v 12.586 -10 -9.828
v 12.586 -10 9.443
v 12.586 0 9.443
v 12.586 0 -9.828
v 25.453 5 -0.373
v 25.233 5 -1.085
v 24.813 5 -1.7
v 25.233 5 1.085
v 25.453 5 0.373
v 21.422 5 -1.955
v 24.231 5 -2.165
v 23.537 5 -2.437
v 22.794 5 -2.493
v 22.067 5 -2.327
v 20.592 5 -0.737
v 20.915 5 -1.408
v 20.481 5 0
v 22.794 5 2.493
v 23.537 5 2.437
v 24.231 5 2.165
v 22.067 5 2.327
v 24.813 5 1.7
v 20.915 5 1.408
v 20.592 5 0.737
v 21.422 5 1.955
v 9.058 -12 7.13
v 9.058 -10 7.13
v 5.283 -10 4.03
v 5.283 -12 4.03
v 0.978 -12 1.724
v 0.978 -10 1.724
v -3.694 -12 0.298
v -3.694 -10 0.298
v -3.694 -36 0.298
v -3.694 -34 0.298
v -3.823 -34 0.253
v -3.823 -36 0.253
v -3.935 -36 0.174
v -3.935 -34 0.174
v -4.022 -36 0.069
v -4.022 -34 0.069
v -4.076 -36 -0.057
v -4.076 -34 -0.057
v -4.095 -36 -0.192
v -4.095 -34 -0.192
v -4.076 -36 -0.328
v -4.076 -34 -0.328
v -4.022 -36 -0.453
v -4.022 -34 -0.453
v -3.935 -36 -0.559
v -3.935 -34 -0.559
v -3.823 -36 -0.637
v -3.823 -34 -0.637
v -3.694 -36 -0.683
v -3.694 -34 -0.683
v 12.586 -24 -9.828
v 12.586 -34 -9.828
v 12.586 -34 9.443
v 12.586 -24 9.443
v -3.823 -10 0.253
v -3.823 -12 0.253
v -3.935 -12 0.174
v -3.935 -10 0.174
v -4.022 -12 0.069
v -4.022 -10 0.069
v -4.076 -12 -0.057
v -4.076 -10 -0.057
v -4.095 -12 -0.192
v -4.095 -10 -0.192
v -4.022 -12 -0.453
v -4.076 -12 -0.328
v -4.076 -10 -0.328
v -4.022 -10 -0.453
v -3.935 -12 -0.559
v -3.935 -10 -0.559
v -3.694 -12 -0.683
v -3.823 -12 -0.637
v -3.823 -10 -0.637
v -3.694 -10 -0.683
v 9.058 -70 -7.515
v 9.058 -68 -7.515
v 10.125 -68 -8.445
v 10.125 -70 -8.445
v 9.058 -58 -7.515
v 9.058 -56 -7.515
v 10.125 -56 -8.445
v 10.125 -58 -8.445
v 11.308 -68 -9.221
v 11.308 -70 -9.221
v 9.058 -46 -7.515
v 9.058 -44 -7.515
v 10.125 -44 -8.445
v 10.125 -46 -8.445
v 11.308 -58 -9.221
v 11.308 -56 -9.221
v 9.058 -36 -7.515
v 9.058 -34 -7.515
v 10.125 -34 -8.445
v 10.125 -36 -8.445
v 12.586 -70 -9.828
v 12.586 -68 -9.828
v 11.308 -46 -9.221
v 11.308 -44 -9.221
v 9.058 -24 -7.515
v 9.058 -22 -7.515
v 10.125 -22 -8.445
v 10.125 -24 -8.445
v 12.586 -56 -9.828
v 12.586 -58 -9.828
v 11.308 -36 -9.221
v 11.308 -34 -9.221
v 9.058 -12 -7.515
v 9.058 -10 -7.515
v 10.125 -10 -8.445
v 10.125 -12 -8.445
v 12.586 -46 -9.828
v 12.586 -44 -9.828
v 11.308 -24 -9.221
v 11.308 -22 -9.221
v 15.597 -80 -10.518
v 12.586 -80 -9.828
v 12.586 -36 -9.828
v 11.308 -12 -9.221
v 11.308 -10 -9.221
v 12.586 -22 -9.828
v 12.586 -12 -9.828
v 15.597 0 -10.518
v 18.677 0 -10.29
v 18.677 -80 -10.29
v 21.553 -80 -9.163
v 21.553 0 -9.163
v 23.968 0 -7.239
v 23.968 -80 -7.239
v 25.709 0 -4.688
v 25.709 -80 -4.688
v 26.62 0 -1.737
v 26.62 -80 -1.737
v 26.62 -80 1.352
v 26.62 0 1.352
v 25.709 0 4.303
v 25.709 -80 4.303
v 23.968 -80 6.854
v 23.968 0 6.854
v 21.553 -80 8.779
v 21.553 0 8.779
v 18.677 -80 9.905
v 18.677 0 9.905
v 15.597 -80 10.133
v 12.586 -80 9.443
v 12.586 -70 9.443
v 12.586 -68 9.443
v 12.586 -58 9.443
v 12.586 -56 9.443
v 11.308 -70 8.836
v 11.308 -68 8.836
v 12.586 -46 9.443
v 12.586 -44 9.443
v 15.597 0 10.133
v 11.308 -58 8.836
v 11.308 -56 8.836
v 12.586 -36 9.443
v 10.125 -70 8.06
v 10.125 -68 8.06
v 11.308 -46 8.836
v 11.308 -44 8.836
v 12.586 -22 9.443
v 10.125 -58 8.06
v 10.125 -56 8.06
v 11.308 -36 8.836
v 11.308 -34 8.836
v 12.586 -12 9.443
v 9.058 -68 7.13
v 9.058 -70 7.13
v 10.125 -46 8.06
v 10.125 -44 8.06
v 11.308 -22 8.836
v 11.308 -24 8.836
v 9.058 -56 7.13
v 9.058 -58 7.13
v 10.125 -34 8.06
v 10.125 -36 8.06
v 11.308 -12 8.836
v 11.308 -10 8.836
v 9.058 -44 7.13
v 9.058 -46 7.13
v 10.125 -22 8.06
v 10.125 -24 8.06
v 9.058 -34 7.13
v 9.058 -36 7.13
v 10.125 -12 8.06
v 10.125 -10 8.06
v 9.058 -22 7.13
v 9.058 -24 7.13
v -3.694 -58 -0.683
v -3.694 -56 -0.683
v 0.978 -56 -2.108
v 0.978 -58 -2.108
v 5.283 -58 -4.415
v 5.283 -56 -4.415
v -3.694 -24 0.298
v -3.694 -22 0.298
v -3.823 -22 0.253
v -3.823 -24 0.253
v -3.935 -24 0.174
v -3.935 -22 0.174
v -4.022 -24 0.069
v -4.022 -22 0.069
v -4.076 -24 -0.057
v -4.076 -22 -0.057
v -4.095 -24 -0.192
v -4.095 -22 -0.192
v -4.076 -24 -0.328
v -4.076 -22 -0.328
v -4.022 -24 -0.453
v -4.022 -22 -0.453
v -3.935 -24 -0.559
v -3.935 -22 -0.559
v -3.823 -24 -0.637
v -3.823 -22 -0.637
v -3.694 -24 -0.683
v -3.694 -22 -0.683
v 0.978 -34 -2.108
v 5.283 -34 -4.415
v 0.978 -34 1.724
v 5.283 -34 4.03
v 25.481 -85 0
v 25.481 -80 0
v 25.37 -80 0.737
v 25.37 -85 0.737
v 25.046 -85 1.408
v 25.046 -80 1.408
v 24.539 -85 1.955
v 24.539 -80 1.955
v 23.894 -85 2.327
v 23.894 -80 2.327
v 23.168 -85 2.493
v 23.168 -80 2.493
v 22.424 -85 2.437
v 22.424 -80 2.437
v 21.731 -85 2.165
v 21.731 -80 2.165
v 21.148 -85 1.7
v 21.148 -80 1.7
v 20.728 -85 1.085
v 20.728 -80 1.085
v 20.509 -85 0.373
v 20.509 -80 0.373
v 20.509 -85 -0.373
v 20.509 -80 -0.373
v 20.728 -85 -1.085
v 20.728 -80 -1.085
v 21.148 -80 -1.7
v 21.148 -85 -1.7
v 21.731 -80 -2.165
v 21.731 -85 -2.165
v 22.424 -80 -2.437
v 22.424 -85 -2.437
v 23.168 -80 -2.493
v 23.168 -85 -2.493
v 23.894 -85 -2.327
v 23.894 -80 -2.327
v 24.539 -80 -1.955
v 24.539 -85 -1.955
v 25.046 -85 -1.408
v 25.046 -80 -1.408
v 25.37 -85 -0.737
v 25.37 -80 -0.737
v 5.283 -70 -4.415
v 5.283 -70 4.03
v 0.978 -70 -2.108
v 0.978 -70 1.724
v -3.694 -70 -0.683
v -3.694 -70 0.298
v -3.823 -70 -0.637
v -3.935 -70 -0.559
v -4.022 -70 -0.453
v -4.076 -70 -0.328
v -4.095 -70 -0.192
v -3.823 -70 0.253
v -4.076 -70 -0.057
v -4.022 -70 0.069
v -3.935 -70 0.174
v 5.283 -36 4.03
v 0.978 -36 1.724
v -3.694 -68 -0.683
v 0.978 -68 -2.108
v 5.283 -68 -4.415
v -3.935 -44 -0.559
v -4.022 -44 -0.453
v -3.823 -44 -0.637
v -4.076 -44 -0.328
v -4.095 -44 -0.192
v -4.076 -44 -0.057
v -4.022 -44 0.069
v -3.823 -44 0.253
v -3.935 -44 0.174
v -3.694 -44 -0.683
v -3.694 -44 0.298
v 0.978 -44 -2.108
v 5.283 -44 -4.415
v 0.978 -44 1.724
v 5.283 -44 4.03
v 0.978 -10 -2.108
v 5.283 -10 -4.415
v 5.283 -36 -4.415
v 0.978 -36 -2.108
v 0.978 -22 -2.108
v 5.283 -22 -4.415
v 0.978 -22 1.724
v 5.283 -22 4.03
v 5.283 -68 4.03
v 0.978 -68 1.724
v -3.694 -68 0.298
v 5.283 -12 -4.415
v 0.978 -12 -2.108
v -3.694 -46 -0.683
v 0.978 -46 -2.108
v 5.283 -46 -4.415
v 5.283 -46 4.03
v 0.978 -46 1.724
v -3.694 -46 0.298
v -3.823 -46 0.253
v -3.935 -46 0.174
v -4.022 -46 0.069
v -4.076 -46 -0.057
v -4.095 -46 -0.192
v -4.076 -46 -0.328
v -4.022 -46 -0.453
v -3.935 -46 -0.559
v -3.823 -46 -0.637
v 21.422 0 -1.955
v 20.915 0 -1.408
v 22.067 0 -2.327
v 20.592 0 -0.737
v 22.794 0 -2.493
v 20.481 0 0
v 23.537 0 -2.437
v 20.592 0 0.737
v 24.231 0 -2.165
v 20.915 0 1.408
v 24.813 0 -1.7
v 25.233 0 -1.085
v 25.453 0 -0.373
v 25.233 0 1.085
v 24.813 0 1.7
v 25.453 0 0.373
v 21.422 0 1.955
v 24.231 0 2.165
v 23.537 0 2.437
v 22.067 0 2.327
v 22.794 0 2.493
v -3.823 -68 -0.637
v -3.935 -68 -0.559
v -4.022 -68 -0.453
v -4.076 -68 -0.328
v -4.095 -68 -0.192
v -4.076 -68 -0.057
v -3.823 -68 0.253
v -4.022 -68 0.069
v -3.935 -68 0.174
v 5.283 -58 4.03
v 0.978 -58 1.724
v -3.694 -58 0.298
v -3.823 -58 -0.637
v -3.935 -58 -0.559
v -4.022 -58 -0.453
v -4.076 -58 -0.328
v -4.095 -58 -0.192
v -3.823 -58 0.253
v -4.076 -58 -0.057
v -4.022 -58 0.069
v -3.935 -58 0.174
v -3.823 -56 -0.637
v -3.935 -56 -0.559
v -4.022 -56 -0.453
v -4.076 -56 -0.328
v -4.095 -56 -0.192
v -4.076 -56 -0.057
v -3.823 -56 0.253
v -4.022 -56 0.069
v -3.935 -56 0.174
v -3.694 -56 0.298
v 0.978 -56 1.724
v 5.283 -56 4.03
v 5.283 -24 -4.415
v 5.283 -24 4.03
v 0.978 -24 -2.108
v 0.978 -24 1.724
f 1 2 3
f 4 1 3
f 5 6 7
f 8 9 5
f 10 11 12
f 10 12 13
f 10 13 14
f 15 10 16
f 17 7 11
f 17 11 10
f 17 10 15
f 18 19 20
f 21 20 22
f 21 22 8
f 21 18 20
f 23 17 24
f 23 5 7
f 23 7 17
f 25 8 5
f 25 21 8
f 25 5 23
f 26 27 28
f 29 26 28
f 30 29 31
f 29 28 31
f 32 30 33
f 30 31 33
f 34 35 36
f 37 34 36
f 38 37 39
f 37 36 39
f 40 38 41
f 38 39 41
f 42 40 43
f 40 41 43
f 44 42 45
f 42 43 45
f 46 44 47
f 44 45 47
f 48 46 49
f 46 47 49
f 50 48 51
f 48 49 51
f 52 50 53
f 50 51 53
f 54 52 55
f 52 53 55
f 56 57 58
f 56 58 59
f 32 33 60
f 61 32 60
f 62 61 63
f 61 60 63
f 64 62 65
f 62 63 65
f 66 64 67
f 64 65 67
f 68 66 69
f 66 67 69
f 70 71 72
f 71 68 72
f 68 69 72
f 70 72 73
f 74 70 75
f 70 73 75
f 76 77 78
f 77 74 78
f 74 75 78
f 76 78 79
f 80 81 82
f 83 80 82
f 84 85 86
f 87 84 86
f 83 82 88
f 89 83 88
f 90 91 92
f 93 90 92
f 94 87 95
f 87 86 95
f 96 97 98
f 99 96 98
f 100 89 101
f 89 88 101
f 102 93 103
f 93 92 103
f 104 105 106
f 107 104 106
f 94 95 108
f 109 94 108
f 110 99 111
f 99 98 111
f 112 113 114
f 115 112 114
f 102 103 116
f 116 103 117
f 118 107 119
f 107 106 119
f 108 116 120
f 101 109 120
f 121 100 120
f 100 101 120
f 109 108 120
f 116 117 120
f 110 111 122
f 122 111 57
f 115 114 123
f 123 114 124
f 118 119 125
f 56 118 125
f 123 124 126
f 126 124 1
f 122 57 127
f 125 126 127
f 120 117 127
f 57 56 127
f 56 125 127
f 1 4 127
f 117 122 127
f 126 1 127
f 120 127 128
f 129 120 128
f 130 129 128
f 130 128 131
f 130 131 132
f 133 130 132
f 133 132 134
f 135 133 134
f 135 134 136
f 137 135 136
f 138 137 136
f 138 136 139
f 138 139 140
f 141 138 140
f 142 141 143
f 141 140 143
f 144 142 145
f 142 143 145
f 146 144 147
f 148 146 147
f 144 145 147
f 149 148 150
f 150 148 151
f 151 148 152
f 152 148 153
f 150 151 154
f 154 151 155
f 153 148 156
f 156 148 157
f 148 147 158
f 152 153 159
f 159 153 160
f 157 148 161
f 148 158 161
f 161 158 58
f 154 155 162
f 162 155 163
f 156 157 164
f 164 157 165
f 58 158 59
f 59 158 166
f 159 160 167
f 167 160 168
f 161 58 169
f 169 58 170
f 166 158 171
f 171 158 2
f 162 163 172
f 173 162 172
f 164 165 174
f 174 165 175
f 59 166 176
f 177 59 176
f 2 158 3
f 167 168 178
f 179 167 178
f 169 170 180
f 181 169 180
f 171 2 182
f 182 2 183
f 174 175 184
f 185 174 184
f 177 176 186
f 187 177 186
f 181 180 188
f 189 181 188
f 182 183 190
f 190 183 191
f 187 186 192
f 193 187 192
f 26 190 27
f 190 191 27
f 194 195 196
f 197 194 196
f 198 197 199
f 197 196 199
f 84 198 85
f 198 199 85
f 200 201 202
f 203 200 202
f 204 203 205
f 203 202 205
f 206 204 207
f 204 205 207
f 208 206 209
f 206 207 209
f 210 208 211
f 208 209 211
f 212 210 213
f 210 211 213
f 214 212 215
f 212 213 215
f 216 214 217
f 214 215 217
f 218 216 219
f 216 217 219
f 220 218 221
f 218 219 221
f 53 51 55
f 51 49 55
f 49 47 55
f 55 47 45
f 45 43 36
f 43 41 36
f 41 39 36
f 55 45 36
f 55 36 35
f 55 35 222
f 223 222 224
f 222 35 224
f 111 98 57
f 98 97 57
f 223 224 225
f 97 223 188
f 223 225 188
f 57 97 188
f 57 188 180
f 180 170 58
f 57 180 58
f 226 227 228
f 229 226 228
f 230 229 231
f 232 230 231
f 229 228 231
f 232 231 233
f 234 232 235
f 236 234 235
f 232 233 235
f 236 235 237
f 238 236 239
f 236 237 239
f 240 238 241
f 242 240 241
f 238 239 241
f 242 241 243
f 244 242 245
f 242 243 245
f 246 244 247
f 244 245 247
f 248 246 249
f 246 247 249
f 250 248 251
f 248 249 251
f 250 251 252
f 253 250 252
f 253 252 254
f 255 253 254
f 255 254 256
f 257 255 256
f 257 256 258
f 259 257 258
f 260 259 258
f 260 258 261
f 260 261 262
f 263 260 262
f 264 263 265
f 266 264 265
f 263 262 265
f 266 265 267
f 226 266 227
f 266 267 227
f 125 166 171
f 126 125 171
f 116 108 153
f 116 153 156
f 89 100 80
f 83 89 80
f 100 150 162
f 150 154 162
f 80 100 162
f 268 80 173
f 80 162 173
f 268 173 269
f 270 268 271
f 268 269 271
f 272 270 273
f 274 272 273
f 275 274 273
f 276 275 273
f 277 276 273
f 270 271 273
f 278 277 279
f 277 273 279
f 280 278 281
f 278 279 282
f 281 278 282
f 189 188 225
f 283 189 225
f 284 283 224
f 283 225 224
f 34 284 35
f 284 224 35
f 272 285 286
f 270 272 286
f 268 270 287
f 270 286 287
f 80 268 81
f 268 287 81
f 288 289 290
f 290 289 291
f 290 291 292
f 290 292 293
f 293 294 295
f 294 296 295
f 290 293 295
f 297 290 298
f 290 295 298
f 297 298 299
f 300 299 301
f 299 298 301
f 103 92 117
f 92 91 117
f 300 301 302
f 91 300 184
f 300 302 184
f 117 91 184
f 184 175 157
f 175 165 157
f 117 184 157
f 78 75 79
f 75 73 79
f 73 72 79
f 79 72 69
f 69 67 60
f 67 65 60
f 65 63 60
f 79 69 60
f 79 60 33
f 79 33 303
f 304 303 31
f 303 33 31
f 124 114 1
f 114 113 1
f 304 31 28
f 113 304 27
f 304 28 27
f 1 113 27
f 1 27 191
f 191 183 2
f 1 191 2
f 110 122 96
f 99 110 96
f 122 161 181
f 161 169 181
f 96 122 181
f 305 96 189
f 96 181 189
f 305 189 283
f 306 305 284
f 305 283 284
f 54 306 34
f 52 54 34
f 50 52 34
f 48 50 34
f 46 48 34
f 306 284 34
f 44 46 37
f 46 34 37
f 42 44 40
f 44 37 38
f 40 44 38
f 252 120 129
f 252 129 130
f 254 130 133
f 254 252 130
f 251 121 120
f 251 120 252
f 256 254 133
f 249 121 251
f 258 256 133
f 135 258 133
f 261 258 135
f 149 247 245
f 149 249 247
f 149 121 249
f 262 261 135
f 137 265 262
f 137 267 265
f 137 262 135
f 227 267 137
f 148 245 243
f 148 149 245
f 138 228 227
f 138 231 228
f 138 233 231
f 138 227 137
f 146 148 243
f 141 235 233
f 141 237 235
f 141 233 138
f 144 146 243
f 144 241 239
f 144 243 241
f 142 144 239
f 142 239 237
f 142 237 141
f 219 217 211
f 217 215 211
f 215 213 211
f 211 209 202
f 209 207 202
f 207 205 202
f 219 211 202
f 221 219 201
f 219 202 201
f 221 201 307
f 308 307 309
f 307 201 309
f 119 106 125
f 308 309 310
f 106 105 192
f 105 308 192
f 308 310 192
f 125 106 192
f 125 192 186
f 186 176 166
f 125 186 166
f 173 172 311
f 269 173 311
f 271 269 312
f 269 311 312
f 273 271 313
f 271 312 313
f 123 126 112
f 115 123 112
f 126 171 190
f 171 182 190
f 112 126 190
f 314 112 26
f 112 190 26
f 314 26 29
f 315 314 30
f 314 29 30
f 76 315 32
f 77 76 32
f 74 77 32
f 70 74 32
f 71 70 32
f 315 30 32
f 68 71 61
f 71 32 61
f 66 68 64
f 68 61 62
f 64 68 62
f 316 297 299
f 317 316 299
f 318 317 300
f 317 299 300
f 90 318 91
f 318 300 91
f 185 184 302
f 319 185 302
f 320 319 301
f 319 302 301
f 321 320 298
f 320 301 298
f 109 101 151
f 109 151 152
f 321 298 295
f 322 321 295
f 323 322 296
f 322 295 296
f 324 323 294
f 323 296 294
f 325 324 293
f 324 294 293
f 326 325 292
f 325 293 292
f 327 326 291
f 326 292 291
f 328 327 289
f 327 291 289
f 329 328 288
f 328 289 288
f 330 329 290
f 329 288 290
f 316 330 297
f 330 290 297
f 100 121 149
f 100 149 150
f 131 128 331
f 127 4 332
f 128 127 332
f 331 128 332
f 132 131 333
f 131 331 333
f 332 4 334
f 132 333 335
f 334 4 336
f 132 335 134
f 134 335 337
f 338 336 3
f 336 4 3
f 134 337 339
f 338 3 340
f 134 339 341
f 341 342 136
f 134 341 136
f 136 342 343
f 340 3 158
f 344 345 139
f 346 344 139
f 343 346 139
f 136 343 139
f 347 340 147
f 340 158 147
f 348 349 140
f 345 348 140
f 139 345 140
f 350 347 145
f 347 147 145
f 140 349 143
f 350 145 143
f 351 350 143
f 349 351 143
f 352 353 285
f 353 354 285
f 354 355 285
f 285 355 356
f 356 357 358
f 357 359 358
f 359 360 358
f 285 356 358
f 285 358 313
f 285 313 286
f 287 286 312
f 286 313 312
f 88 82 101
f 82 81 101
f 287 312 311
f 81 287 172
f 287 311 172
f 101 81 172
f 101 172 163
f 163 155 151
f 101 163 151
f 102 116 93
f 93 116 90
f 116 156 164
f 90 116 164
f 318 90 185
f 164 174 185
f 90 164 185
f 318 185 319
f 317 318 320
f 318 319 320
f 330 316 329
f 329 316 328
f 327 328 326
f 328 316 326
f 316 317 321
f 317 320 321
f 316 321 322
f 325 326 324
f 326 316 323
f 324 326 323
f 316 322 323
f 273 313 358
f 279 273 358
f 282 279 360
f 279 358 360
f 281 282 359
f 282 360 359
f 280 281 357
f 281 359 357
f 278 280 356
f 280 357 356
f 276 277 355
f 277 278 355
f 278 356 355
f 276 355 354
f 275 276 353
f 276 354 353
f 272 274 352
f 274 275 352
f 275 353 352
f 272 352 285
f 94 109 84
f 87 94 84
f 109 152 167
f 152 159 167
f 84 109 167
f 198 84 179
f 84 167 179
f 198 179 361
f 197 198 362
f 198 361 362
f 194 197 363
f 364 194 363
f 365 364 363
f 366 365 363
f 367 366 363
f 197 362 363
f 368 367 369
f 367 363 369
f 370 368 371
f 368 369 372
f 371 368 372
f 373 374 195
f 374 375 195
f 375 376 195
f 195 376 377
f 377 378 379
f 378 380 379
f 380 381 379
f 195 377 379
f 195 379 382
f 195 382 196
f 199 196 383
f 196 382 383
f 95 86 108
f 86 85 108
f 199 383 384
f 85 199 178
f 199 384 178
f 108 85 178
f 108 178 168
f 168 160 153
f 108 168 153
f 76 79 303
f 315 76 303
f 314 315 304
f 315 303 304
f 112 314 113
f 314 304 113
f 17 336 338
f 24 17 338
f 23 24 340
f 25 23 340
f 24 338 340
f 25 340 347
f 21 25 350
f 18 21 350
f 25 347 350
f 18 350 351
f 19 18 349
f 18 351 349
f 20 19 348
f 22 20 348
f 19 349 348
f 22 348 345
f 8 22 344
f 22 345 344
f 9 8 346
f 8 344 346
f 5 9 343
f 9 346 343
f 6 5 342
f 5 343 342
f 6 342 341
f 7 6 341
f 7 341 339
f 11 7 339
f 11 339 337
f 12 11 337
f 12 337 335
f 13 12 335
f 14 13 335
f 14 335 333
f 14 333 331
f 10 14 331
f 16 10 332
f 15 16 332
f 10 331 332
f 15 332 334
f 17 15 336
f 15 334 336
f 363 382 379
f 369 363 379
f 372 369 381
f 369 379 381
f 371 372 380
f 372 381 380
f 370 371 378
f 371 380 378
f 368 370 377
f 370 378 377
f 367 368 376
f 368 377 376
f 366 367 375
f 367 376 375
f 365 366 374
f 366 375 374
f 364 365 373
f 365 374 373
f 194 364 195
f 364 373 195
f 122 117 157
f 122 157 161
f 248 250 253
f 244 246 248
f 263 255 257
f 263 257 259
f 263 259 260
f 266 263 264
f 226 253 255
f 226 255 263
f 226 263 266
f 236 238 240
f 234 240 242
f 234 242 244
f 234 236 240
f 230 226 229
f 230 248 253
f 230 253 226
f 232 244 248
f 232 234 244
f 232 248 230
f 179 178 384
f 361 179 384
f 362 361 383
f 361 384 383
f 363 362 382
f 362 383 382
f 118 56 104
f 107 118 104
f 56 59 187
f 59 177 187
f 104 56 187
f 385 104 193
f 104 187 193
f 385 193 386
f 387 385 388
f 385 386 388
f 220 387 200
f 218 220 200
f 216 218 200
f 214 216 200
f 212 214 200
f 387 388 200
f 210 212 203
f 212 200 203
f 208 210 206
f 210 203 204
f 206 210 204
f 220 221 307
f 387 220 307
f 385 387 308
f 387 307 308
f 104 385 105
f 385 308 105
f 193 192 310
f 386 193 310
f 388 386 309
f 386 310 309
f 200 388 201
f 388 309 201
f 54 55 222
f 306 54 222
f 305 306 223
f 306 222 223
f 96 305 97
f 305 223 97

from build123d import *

# Parameters (mm, degrees)
F1_DEPTH = 80
F3_DEPTH = 12.5
F4_R     = 2.5
F5_DEPTH = 5
F6_R     = 2.5
F7_DEPTH = 5


with BuildPart() as f1:
    # F0 (on Front) → F1 (new body)
    with BuildSketch(Plane.XZ):
        with BuildLine():
            ThreePointArc((9.05775, 7.130023), (3.187096, 2.771486), (-3.69351, 0.297888))
            ThreePointArc((-3.69351, 0.297888), (-4.094982, -0.192308), (-3.69351, -0.682504))
            ThreePointArc((-3.69351, -0.682504), (3.187096, -3.156101), (9.05775, -7.514638))
            ThreePointArc((9.05775, -7.514638), (26.735419, -0.192308), (9.05775, 7.130023))
        make_face()
    extrude(amount=F1_DEPTH)

    # F2 (on Top) → F3 (cut, symmetric)
    with BuildSketch(Plane.XY):
        Polygon((-6.228959, -12), (-6.228959, -10), (12.586473, -10), (12.586473, 2.989336), (-20.302792, 2.989336), (-20.302792, -84.092789), (12.586473, -84.752782), (12.586473, -70), (-6.228959, -70), (-6.228959, -68), (12.586473, -68), (12.586473, -58), (-6.228959, -58), (-6.228959, -56), (12.586473, -56), (12.586473, -46), (-5.693135, -46), (-5.693135, -44), (12.586473, -44), (12.586473, -36), (-6.228959, -36), (-6.228959, -34), (12.586473, -34), (12.586473, -24), (-6.228959, -24), (-6.228959, -22), (12.586473, -22), (12.586473, -12), align=None)
    extrude(amount=F3_DEPTH, both=True, mode=Mode.SUBTRACT)

    # F4 (on face) → F5 (join)
    with BuildSketch(Plane.XZ.offset(80)):
        with Locations((22.98077, 0)):
            Circle(F4_R)
    extrude(amount=F5_DEPTH)

    # F6 (on face) → F7 (join)
    with BuildSketch(Plane(origin=(0, 0, 0), x_dir=(-1, 0, 0), z_dir=(0, 1, 0))):
        with Locations((-22.98077, 0)):
            Circle(F6_R)
    extrude(amount=F7_DEPTH)


solid = f1.part
